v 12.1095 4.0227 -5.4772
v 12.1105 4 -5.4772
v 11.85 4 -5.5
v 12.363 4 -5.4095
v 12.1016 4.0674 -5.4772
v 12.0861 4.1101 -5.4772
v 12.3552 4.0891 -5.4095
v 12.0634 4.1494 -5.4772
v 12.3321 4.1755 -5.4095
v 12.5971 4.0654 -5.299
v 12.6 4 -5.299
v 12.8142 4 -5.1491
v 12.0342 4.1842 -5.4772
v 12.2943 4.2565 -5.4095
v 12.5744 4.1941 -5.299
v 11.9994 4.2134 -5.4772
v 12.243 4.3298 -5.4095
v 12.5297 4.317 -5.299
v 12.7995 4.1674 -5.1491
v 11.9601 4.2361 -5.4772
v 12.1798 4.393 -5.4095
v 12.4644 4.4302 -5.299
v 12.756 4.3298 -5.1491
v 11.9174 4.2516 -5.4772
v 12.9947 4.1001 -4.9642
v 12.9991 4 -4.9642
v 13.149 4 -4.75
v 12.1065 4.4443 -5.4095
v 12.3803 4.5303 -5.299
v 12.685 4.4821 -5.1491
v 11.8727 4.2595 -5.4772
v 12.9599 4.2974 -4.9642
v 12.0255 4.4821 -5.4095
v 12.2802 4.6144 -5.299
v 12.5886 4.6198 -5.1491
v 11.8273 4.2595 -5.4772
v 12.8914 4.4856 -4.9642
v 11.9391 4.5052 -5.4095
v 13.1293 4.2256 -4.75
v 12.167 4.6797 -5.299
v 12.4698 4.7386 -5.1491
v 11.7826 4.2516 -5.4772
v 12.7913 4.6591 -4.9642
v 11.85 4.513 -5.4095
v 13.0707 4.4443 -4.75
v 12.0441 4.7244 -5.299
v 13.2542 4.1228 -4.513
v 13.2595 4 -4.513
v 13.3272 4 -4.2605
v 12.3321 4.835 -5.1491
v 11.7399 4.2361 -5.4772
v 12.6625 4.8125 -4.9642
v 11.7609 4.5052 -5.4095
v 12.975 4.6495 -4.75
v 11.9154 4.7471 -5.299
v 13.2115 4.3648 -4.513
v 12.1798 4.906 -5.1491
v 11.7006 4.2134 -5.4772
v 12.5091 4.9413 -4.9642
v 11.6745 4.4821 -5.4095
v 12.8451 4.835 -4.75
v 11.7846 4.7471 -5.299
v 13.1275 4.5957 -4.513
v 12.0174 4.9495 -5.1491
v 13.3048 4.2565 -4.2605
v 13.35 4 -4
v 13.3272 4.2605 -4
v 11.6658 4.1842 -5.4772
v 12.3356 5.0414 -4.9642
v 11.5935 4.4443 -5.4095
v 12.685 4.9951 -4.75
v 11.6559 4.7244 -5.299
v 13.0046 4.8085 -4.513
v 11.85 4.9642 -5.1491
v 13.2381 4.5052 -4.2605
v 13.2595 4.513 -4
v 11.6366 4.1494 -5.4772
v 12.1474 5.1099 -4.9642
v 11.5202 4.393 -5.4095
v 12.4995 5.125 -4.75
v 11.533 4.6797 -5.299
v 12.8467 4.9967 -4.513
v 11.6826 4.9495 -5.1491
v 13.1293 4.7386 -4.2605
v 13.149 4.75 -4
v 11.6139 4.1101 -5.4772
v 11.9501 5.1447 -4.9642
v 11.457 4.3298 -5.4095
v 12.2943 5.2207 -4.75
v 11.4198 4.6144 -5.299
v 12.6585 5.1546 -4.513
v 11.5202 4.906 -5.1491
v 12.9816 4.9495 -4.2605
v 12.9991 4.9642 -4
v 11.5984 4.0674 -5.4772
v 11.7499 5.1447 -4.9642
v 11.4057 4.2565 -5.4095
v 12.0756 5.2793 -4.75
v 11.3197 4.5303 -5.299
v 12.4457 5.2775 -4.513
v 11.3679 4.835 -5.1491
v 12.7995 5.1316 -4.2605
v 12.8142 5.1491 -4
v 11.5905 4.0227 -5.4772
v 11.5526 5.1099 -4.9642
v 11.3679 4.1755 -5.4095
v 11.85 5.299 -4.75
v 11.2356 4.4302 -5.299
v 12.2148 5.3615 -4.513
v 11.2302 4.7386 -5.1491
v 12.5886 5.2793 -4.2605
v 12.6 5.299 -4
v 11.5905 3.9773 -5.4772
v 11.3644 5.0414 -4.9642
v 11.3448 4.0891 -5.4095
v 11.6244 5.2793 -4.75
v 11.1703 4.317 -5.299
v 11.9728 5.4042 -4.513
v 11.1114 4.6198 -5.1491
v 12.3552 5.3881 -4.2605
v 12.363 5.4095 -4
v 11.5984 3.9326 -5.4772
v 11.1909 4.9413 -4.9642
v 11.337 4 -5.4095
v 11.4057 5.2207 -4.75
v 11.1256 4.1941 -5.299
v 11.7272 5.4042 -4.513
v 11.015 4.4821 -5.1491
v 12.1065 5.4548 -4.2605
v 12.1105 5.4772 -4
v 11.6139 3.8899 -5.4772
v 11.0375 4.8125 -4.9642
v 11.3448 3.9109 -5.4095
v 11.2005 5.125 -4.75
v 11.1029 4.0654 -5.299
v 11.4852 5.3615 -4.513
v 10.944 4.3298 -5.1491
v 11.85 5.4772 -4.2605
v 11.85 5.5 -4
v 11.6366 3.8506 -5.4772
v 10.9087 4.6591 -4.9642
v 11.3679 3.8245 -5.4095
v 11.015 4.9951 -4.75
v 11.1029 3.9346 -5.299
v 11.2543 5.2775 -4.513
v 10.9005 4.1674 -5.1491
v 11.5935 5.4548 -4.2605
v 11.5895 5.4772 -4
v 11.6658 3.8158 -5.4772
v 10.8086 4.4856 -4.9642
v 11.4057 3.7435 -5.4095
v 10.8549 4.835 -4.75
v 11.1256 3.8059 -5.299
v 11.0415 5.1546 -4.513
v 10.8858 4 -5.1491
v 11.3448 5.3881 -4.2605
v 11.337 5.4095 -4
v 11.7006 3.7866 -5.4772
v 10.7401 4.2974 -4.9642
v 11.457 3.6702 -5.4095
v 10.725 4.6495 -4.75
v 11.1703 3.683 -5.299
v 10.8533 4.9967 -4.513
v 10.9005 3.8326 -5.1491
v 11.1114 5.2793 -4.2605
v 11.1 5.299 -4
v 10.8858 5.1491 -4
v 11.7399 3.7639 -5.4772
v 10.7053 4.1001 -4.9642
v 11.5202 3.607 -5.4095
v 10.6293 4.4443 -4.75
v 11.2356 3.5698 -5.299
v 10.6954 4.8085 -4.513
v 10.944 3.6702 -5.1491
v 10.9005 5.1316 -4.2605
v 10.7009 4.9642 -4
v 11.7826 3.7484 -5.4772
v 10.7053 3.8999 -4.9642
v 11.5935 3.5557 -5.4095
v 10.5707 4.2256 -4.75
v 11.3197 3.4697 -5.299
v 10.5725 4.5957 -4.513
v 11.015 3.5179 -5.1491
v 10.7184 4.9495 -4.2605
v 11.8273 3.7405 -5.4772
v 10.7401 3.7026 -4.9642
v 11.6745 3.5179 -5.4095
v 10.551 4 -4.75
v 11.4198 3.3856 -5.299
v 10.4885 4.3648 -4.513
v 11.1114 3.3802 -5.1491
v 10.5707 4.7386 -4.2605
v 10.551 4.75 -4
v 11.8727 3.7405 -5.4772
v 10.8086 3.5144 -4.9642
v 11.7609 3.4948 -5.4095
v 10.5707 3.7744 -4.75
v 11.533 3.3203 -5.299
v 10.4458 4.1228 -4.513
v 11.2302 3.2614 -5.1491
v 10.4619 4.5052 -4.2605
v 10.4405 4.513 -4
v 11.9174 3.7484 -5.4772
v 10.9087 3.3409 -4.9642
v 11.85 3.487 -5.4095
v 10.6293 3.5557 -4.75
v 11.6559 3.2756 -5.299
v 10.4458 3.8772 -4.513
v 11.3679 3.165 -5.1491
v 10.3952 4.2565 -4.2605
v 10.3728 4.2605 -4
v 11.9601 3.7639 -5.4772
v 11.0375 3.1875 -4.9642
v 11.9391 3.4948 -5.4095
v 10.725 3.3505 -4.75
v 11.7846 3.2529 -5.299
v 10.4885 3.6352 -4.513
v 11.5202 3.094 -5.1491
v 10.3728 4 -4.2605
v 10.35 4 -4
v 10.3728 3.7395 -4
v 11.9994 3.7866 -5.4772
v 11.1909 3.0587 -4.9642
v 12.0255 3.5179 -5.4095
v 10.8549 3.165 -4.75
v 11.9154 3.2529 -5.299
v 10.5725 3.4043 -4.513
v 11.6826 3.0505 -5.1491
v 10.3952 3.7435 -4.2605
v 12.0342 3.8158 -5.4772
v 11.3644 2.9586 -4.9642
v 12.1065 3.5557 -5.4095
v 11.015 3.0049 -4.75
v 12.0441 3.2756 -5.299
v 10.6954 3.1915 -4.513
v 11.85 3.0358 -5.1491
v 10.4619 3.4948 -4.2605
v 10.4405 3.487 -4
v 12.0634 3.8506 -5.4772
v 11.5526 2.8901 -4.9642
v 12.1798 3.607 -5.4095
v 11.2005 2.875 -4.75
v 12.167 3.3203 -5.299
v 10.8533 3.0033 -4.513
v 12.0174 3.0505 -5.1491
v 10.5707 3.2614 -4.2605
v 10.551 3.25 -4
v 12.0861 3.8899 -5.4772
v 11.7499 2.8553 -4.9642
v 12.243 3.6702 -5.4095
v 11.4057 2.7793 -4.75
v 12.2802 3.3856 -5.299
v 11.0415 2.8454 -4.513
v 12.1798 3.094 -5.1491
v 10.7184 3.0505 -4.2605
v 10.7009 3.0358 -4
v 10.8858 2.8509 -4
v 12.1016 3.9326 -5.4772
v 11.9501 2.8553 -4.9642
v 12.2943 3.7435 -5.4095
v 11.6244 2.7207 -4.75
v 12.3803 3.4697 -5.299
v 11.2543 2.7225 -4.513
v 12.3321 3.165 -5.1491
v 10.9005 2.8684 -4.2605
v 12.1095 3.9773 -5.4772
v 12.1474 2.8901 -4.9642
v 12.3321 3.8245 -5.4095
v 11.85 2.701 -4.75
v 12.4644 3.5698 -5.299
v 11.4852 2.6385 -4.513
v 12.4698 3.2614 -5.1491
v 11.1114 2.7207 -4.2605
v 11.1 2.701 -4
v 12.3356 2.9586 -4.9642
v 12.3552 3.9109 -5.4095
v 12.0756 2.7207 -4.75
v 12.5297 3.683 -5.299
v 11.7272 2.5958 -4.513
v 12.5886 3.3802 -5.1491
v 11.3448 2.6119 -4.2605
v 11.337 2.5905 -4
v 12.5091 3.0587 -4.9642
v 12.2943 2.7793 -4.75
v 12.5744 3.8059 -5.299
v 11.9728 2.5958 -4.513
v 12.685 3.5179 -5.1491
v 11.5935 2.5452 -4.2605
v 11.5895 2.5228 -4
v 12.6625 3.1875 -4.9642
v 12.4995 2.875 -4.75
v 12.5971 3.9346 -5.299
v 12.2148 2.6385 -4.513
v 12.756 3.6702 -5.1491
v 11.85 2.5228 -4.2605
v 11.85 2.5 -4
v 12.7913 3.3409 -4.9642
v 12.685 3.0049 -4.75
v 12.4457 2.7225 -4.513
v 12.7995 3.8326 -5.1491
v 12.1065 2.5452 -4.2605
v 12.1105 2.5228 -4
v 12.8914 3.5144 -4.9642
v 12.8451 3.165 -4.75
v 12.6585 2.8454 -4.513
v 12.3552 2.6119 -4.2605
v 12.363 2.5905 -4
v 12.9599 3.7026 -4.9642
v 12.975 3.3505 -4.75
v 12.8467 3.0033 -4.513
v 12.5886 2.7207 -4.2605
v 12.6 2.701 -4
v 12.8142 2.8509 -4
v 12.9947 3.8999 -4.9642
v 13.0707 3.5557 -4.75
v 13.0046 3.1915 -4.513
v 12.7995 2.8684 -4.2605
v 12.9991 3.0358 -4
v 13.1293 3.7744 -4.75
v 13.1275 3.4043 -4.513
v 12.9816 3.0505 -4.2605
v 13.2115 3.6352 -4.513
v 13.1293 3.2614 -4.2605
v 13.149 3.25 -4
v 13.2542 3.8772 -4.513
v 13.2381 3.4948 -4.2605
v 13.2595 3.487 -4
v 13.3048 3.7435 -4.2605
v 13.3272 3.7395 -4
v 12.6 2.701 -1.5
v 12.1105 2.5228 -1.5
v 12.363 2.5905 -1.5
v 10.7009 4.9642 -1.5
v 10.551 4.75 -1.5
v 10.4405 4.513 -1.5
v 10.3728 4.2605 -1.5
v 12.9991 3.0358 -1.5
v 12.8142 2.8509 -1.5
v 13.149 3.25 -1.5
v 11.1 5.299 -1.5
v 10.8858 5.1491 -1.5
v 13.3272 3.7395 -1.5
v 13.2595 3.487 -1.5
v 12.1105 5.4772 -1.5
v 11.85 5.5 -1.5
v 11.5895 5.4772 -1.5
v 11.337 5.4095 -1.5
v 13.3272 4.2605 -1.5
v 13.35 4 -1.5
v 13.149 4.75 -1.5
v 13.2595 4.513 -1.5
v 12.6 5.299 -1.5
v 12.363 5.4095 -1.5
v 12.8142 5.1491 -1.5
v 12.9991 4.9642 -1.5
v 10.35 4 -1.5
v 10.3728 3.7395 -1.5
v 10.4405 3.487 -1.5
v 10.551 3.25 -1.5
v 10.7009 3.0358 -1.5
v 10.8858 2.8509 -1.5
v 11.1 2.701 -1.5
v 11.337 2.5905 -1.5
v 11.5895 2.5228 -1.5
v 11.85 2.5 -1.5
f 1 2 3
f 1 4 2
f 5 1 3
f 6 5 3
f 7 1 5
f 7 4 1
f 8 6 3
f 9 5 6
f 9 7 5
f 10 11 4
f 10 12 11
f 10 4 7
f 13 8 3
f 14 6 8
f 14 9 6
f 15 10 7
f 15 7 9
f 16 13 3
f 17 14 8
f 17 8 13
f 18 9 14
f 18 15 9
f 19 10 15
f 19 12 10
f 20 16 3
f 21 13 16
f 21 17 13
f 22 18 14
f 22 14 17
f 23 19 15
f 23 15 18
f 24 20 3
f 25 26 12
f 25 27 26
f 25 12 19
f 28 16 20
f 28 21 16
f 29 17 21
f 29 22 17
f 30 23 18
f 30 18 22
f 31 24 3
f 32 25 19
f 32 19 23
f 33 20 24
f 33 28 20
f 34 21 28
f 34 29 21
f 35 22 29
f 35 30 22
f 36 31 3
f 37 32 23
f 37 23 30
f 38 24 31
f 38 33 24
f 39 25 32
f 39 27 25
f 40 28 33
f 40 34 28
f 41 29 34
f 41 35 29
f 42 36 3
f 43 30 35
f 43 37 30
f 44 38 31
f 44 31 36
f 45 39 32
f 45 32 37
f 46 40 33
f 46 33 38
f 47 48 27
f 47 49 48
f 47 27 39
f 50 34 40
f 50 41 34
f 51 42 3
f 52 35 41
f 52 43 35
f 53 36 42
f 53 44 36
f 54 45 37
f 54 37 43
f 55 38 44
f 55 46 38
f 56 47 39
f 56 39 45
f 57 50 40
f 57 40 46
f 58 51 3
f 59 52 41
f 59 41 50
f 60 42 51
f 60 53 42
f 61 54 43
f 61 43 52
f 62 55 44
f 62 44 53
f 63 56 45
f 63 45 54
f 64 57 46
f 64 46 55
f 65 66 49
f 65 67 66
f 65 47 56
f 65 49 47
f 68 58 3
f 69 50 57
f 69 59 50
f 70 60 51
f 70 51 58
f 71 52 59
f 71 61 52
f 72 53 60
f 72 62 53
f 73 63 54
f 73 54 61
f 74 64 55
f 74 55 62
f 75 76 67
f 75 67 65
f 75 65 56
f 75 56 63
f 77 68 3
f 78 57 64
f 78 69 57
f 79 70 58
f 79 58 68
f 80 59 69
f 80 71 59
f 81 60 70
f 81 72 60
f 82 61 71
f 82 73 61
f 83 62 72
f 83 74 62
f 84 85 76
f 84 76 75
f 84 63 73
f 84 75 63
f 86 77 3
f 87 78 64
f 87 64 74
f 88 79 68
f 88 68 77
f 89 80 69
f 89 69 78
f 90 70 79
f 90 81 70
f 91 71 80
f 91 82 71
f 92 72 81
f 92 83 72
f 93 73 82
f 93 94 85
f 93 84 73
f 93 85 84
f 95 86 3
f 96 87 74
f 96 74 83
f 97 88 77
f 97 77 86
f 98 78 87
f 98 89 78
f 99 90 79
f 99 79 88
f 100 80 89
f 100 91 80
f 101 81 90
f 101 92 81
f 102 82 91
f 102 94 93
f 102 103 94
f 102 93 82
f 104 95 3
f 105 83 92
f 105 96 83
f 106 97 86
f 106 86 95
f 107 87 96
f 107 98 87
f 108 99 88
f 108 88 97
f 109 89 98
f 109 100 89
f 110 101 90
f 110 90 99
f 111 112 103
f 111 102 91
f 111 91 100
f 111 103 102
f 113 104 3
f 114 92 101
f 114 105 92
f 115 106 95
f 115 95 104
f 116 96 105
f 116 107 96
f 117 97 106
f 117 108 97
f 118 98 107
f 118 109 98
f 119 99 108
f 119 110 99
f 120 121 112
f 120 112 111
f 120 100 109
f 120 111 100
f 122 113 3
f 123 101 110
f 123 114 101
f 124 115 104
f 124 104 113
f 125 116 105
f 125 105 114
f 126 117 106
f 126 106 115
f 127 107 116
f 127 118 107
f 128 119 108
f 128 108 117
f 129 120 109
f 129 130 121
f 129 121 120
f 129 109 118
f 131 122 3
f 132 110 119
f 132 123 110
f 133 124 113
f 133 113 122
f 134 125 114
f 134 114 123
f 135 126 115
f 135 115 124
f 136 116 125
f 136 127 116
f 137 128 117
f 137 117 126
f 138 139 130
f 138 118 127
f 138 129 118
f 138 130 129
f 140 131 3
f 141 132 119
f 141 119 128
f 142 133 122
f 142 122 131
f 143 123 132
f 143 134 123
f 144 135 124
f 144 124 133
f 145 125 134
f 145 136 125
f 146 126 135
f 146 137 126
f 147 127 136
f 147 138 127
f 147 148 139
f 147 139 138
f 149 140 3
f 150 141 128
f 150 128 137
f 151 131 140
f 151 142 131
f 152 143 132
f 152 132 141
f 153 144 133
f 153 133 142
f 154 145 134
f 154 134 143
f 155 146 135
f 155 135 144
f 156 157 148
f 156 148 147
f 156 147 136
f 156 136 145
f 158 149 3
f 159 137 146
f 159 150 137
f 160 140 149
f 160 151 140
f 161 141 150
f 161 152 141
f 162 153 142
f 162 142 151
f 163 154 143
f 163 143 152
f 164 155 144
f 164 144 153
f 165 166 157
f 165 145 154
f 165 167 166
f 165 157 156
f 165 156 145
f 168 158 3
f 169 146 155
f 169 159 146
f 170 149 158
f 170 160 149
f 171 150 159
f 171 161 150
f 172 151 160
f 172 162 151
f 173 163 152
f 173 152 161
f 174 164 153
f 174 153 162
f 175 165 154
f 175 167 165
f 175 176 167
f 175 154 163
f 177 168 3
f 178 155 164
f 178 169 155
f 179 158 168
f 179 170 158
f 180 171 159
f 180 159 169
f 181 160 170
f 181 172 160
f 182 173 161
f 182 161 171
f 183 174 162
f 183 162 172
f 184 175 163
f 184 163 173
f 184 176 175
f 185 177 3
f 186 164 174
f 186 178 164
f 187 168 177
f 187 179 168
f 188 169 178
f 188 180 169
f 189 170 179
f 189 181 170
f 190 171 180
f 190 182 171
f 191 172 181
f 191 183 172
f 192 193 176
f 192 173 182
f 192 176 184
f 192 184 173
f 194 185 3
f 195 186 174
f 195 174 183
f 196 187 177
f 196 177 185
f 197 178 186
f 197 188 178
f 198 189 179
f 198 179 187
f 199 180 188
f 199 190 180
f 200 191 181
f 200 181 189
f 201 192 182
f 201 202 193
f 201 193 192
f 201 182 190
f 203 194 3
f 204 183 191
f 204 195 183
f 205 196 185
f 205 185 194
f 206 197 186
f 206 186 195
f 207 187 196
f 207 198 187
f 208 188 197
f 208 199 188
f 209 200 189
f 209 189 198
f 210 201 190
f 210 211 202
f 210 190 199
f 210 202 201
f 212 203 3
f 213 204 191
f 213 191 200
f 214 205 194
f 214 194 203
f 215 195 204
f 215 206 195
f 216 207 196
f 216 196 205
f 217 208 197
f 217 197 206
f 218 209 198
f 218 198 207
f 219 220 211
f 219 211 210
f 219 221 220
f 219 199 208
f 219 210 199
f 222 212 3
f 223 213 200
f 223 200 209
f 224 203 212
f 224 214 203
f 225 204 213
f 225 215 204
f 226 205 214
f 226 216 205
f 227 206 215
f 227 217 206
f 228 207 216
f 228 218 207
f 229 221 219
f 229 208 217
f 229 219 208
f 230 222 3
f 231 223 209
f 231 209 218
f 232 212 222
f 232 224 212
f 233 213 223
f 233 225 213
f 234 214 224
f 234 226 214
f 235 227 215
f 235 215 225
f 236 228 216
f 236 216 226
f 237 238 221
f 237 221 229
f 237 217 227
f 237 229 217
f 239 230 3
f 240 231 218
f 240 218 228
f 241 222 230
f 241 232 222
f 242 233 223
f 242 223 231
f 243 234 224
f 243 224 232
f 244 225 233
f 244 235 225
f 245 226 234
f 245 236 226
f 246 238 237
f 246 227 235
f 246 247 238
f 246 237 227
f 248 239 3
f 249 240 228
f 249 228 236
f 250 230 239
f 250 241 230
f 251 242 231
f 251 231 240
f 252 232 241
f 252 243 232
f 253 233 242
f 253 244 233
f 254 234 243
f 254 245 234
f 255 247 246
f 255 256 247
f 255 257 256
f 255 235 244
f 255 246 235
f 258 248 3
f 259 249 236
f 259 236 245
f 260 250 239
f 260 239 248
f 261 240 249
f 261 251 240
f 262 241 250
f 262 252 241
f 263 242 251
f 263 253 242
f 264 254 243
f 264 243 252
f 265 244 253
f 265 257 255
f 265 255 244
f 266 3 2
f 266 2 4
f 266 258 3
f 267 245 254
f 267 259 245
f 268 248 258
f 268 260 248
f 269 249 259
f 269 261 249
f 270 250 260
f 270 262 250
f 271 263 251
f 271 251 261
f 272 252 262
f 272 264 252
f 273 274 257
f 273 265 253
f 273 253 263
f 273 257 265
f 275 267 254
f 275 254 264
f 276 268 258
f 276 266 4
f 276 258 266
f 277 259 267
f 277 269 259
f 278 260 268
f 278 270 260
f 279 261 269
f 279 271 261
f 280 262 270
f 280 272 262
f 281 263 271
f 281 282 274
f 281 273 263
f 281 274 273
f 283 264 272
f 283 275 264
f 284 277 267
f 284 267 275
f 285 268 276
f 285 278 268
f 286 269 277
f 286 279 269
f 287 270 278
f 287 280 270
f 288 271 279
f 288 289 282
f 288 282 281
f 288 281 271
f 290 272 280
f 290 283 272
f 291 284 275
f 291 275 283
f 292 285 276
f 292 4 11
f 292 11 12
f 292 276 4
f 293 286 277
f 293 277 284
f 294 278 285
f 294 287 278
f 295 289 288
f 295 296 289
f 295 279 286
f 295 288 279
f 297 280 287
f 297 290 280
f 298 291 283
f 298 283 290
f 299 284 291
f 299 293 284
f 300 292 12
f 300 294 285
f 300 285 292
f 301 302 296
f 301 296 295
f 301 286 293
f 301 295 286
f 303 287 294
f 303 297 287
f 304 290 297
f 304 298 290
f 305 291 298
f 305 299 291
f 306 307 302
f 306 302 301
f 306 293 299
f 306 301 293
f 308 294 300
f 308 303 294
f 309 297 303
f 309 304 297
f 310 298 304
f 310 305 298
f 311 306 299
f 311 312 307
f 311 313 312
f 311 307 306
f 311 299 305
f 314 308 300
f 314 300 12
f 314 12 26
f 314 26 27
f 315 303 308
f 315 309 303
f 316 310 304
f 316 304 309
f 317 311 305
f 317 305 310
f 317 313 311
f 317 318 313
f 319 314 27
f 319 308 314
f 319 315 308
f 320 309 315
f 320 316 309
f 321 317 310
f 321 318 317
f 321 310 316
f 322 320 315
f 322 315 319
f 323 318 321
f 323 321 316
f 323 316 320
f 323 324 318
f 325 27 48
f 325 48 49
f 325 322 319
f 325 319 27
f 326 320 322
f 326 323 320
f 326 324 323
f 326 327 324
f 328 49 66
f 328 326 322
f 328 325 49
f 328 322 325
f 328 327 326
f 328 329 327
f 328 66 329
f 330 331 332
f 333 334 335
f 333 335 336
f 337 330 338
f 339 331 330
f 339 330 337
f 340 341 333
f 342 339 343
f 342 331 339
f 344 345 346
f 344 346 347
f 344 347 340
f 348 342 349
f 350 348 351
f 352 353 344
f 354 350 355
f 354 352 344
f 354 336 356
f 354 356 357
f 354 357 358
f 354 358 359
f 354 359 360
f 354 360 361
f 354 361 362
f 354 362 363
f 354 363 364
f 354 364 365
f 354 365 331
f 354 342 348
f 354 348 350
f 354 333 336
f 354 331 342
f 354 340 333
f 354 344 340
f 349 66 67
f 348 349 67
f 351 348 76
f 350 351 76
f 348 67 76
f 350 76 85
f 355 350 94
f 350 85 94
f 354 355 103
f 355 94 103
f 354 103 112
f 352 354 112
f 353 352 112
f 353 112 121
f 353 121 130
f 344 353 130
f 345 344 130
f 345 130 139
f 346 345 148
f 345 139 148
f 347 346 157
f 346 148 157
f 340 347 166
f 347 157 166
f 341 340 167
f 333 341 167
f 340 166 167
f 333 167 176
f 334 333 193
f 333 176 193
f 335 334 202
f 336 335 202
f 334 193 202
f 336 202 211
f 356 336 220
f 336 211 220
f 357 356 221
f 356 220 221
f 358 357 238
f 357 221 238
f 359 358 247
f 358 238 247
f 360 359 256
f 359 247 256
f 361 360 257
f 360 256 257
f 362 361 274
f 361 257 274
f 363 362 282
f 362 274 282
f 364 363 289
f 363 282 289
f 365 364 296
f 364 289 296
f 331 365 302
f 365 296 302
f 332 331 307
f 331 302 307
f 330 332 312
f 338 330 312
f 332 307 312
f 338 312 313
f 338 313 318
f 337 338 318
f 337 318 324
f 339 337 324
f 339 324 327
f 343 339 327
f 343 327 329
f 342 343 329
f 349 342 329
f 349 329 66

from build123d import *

# Parameters (mm, degrees)
CYLINDER002_R     = 1.5
CYLINDER002_DEPTH = 2.5


with BuildPart() as cilindro002:
    # Cylinder002 → Cylinder002 (new body)
    with BuildSketch(Plane.XY):
        Circle(CYLINDER002_R)
    extrude(amount=CYLINDER002_DEPTH)


with BuildPart() as ir_photo:
    # Sphere001 → Sphere001 (revolve)
    with BuildSketch(Plane.XZ):
        with BuildLine():
            ThreePointArc((0, -1.5), (1.5, 0), (0, 1.5))
            Line((0, 1.5), (0, -1.5))
        make_face()
    revolve(axis=Axis((0, 0, 0), (0, 0, 1)))

    # Fusion003: union Cilindro002
    add(cilindro002.part)


with BuildPart() as ir_photo_1:
    # Fusion003 placement: moved
    add(ir_photo.part.moved(Location((11.85, 4, -4))))


solid = ir_photo_1.part
